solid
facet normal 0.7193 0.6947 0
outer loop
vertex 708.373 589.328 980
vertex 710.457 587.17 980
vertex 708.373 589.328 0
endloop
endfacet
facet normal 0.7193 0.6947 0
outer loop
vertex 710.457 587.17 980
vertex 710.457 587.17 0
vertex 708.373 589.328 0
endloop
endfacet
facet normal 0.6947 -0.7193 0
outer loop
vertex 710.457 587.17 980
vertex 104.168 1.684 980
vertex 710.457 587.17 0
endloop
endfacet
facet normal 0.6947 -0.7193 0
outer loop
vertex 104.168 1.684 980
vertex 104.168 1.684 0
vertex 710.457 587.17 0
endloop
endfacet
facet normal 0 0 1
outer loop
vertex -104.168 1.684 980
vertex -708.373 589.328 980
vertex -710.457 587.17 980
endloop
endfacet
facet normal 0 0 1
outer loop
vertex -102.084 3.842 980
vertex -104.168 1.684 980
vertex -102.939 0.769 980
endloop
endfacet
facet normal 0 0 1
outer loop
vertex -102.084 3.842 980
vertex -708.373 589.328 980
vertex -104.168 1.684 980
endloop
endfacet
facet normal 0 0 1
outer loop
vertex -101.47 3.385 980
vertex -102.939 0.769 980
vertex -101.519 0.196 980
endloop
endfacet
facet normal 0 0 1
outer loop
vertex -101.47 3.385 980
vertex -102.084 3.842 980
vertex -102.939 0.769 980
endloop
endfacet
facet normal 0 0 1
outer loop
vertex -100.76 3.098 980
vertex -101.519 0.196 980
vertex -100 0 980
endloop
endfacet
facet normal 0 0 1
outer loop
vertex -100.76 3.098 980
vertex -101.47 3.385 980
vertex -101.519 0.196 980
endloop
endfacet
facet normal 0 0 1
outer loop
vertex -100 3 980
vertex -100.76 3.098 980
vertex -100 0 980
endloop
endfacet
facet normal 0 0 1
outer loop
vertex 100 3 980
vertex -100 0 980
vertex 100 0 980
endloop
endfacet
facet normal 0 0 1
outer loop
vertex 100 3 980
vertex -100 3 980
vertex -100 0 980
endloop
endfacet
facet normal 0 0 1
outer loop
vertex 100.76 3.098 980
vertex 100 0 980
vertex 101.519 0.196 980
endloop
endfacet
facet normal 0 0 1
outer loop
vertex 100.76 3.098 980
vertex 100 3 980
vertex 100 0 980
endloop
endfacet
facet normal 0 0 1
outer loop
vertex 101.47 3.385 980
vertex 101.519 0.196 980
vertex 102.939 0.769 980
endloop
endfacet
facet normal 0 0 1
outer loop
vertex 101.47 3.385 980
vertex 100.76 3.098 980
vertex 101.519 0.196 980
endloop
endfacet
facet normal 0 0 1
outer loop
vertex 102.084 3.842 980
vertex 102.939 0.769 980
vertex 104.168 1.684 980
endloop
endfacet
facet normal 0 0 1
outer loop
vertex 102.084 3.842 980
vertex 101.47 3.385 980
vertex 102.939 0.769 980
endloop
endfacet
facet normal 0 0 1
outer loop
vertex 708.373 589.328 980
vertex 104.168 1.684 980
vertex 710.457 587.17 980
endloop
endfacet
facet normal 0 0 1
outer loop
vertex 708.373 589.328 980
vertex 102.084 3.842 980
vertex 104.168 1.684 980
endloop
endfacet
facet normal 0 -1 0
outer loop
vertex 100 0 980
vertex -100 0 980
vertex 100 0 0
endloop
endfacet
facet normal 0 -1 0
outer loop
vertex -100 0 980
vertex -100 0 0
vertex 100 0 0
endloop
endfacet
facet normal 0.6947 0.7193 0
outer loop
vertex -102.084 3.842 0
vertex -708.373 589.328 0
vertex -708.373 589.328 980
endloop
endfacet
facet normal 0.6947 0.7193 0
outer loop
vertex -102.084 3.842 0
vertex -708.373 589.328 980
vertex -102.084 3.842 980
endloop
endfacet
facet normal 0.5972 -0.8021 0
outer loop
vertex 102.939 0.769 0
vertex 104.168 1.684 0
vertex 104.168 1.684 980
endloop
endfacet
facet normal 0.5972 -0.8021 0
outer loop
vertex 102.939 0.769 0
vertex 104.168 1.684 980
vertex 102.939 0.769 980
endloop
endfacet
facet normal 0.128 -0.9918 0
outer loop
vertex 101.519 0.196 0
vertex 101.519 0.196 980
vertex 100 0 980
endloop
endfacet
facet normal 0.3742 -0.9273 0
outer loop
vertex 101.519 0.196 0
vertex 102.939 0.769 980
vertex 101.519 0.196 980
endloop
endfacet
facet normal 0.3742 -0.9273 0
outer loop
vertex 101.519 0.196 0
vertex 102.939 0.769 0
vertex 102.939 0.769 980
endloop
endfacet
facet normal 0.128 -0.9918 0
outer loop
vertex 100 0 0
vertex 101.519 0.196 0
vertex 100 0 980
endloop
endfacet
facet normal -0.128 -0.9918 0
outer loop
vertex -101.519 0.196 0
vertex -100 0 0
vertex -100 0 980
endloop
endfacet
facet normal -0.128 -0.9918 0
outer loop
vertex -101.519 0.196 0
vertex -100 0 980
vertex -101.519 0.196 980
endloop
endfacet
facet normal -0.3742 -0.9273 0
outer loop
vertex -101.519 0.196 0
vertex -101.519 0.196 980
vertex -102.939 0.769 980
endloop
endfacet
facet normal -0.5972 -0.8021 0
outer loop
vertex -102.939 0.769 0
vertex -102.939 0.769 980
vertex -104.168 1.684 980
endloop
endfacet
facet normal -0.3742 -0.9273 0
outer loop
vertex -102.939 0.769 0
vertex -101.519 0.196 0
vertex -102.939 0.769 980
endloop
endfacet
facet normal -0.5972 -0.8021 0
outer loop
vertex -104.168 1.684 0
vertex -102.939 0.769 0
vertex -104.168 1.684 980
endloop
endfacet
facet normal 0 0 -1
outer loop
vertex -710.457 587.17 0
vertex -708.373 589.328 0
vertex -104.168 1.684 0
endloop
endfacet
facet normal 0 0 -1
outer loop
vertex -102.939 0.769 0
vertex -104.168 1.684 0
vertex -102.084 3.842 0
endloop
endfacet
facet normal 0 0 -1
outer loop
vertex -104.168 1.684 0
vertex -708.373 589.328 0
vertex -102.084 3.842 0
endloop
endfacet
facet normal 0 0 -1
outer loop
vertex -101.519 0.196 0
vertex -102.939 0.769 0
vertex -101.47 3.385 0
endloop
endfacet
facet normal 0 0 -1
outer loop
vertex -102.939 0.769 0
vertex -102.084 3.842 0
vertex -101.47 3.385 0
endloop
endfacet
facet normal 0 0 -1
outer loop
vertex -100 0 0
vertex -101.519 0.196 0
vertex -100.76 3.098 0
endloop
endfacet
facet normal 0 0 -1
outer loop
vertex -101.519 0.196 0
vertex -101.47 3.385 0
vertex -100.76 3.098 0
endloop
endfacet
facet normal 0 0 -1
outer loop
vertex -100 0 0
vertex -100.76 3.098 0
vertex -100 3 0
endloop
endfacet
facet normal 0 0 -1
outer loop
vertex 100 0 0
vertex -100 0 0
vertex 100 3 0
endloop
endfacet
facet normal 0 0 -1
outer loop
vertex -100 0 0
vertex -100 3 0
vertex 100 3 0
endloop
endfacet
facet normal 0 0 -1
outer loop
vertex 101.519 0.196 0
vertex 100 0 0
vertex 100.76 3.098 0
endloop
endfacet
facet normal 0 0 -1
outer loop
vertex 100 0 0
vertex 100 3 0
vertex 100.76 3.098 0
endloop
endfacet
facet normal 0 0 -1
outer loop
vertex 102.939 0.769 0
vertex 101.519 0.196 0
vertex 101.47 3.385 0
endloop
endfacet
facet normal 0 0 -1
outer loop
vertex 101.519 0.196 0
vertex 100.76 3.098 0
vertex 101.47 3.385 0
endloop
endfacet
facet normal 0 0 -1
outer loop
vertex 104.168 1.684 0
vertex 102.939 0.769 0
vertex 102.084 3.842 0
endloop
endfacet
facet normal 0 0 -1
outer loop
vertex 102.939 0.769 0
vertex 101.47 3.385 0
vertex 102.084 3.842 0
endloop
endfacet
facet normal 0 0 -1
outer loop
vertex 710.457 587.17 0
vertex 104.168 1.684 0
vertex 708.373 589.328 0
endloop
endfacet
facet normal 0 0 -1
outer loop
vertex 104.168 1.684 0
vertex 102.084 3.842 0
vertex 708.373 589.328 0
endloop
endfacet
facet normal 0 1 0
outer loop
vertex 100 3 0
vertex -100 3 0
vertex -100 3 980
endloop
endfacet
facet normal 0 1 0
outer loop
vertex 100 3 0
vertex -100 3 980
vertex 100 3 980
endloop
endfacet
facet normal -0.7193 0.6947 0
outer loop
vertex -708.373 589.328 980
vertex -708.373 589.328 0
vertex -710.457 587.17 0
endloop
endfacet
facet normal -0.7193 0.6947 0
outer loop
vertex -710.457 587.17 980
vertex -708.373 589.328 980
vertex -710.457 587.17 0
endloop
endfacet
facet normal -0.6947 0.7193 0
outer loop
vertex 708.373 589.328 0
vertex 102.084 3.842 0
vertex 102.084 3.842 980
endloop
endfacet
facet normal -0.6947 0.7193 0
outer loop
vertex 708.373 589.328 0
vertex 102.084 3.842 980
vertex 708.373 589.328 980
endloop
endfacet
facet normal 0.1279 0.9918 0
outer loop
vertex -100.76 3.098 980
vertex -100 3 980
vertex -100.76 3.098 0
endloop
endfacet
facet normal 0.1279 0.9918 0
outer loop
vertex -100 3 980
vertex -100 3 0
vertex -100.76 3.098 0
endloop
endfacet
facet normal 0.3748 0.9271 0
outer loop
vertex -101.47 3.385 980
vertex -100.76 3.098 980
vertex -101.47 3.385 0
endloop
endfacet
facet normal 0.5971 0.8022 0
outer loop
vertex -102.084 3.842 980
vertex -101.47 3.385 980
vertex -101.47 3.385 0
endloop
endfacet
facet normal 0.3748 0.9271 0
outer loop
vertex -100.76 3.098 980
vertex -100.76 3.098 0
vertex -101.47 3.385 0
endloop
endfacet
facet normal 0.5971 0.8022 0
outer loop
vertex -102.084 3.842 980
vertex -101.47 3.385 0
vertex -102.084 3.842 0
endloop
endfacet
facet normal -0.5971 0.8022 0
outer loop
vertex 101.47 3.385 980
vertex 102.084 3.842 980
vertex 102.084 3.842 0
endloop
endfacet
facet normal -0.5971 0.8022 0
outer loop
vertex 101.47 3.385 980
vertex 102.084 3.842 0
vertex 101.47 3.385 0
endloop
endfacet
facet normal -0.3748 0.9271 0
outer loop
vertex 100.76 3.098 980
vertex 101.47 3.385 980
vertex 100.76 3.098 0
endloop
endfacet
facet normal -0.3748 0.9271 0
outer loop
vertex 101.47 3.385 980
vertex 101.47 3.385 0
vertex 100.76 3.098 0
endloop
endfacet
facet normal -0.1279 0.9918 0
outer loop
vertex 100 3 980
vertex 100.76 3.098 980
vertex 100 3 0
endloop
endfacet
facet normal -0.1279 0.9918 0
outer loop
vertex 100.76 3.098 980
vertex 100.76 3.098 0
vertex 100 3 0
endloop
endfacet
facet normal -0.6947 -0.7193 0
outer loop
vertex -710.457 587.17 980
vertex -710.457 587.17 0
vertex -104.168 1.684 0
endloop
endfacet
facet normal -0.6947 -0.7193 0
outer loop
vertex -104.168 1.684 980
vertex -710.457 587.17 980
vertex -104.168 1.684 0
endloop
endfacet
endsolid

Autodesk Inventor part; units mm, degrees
ref_plane "YZ Plane" through (0, 0, 0) normal (1, 0, 0) x (0, 1, 0)
ref_plane "XZ Plane" through (0, 0, 0) normal (0, 1, 0) x (-1, 0, 0)
ref_plane "XY Plane" through (0, 0, 0) normal (0, 0, 1) x (1, 0, 0)
sketch "Sketch1" plane through (0, 0, 0) normal (0, 0, 1) x (1, 0, 0)
  line L0 (104.168, 1.684) -> (710.4569, 587.1704)
  arc A0 (100, 0) -> (104.168, 1.684) centre (100, 6) ccw
  line L1 (0, 0) -> (100, 0)
  dimension "d25" = 6
  dimension "d48" = 710.457
  dimension "d49" = 136
  dimension "d50" = 100
contour flange "Contour Flange1" sketch "Sketch1" thickness 3 bend radius 3 width 980 along (0, 0, 1) mid plane no both sides no wall seen from (50, 0, 0) lies toward (0, 1, 0) curves L1 A0 L0
bend "Bend1"
corner "Corner1"
mirror "Mirror1" about plane through (0, 0, 0) normal (1, 0, 0)
equation "\"d25\" = Thickness + BendRadius"
equation "\"d7\" = Thickness"
equation "\"d8\" = BendReliefWidth"
equation "\"d9\" = BendReliefDepth"
equation "\"d10\" = MinimumRemnant"
equation "\"d11\" = TransitionRadius"
equation "\"d13\" = BendRadius"
equation "\"d15\" = CornerReliefSize"
equation "\"d16\" = GapSize"
equation "\"d17\" = JacobiRadiusSize"
equation "\"BendRadius\" = Thickness"
equation "\"BendReliefWidth\" = Thickness"
equation "\"BendReliefDepth\" = 0.5 * Thickness"
equation "\"CornerReliefSize\" = 4 * Thickness"
equation "\"MinimumRemnant\" = 2 * Thickness"
equation "\"TransitionRadius\" = BendRadius"
equation "\"JacobiRadiusSize\" = BendRadius"
equation "\"GapSize\" = Thickness"
equation "\"d38\" = d40 + d44"
equation "\"d39\" = d40"
equation "\"d44\" = d40"
equation "\"Thickness\" = 3"
equation "\"d40\" = 3"
properties part number "MSC 041 sheet belly main" material "Stainless Steel"
